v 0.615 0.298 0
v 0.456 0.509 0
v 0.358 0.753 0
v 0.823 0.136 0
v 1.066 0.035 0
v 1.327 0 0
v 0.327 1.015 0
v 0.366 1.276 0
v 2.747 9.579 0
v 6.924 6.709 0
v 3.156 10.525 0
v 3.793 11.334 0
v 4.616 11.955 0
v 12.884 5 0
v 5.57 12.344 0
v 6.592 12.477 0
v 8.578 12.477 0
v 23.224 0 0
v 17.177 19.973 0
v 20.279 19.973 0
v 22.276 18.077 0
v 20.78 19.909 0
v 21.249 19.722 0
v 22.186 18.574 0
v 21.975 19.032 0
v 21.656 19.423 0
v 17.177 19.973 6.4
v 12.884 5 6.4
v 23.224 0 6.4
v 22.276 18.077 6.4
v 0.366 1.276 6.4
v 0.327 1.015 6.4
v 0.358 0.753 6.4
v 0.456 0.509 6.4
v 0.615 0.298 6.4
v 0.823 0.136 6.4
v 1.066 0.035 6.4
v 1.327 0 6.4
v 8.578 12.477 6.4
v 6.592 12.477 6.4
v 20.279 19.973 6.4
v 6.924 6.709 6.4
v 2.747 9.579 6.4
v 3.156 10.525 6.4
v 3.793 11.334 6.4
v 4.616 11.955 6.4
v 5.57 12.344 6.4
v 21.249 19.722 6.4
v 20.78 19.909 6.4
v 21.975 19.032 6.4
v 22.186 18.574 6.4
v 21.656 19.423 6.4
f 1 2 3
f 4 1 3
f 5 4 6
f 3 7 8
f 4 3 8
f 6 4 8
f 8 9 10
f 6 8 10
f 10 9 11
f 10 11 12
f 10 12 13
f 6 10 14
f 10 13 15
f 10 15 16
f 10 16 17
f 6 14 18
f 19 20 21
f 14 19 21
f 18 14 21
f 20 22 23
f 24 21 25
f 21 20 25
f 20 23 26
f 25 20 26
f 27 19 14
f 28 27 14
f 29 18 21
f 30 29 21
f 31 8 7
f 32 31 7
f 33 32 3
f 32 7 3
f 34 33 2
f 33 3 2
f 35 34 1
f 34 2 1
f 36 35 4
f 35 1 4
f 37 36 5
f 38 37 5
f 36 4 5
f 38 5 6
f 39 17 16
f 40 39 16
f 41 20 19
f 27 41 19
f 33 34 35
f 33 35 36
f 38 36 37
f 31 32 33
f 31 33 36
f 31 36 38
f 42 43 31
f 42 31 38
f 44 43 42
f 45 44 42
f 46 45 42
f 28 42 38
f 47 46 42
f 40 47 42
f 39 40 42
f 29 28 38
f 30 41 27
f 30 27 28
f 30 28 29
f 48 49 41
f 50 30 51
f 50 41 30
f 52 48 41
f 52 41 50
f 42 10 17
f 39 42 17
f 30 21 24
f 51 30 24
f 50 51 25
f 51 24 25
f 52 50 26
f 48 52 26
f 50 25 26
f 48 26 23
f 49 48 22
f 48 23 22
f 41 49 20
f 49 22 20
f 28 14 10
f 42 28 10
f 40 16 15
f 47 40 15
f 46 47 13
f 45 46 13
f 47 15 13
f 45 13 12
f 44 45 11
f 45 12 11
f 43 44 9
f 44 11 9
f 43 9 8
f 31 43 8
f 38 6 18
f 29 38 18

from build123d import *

# Parameters (mm, degrees)
F1_DEPTH = 6.4


with BuildPart() as f1:
    # F0 (on Top) → F1 (new body)
    with BuildSketch(Plane.XY):
        with BuildLine():
            Line((1.327045, 0), (23.223624, 0))
            Line((23.223624, 0), (22.276235, 18.077263))
            ThreePointArc((22.276235, 18.077263), (21.655685, 19.423339), (20.278976, 19.972591))
            Line((20.278976, 19.972591), (17.176905, 19.972591))
            Line((17.176905, 19.972591), (12.883583, 5))
            Line((12.883583, 5), (6.923761, 6.708952))
            Line((6.923761, 6.708952), (8.577585, 12.476522))
            Line((8.577585, 12.476522), (6.591801, 12.476522))
            ThreePointArc((6.591801, 12.476522), (4.184541, 11.671064), (2.746754, 9.579071))
            Line((2.746754, 9.579071), (0.365783, 1.275637))
            ThreePointArc((0.365783, 1.275637), (0.528409, 0.398185), (1.327045, 0))
        make_face()
    extrude(amount=F1_DEPTH)


solid = f1.part
